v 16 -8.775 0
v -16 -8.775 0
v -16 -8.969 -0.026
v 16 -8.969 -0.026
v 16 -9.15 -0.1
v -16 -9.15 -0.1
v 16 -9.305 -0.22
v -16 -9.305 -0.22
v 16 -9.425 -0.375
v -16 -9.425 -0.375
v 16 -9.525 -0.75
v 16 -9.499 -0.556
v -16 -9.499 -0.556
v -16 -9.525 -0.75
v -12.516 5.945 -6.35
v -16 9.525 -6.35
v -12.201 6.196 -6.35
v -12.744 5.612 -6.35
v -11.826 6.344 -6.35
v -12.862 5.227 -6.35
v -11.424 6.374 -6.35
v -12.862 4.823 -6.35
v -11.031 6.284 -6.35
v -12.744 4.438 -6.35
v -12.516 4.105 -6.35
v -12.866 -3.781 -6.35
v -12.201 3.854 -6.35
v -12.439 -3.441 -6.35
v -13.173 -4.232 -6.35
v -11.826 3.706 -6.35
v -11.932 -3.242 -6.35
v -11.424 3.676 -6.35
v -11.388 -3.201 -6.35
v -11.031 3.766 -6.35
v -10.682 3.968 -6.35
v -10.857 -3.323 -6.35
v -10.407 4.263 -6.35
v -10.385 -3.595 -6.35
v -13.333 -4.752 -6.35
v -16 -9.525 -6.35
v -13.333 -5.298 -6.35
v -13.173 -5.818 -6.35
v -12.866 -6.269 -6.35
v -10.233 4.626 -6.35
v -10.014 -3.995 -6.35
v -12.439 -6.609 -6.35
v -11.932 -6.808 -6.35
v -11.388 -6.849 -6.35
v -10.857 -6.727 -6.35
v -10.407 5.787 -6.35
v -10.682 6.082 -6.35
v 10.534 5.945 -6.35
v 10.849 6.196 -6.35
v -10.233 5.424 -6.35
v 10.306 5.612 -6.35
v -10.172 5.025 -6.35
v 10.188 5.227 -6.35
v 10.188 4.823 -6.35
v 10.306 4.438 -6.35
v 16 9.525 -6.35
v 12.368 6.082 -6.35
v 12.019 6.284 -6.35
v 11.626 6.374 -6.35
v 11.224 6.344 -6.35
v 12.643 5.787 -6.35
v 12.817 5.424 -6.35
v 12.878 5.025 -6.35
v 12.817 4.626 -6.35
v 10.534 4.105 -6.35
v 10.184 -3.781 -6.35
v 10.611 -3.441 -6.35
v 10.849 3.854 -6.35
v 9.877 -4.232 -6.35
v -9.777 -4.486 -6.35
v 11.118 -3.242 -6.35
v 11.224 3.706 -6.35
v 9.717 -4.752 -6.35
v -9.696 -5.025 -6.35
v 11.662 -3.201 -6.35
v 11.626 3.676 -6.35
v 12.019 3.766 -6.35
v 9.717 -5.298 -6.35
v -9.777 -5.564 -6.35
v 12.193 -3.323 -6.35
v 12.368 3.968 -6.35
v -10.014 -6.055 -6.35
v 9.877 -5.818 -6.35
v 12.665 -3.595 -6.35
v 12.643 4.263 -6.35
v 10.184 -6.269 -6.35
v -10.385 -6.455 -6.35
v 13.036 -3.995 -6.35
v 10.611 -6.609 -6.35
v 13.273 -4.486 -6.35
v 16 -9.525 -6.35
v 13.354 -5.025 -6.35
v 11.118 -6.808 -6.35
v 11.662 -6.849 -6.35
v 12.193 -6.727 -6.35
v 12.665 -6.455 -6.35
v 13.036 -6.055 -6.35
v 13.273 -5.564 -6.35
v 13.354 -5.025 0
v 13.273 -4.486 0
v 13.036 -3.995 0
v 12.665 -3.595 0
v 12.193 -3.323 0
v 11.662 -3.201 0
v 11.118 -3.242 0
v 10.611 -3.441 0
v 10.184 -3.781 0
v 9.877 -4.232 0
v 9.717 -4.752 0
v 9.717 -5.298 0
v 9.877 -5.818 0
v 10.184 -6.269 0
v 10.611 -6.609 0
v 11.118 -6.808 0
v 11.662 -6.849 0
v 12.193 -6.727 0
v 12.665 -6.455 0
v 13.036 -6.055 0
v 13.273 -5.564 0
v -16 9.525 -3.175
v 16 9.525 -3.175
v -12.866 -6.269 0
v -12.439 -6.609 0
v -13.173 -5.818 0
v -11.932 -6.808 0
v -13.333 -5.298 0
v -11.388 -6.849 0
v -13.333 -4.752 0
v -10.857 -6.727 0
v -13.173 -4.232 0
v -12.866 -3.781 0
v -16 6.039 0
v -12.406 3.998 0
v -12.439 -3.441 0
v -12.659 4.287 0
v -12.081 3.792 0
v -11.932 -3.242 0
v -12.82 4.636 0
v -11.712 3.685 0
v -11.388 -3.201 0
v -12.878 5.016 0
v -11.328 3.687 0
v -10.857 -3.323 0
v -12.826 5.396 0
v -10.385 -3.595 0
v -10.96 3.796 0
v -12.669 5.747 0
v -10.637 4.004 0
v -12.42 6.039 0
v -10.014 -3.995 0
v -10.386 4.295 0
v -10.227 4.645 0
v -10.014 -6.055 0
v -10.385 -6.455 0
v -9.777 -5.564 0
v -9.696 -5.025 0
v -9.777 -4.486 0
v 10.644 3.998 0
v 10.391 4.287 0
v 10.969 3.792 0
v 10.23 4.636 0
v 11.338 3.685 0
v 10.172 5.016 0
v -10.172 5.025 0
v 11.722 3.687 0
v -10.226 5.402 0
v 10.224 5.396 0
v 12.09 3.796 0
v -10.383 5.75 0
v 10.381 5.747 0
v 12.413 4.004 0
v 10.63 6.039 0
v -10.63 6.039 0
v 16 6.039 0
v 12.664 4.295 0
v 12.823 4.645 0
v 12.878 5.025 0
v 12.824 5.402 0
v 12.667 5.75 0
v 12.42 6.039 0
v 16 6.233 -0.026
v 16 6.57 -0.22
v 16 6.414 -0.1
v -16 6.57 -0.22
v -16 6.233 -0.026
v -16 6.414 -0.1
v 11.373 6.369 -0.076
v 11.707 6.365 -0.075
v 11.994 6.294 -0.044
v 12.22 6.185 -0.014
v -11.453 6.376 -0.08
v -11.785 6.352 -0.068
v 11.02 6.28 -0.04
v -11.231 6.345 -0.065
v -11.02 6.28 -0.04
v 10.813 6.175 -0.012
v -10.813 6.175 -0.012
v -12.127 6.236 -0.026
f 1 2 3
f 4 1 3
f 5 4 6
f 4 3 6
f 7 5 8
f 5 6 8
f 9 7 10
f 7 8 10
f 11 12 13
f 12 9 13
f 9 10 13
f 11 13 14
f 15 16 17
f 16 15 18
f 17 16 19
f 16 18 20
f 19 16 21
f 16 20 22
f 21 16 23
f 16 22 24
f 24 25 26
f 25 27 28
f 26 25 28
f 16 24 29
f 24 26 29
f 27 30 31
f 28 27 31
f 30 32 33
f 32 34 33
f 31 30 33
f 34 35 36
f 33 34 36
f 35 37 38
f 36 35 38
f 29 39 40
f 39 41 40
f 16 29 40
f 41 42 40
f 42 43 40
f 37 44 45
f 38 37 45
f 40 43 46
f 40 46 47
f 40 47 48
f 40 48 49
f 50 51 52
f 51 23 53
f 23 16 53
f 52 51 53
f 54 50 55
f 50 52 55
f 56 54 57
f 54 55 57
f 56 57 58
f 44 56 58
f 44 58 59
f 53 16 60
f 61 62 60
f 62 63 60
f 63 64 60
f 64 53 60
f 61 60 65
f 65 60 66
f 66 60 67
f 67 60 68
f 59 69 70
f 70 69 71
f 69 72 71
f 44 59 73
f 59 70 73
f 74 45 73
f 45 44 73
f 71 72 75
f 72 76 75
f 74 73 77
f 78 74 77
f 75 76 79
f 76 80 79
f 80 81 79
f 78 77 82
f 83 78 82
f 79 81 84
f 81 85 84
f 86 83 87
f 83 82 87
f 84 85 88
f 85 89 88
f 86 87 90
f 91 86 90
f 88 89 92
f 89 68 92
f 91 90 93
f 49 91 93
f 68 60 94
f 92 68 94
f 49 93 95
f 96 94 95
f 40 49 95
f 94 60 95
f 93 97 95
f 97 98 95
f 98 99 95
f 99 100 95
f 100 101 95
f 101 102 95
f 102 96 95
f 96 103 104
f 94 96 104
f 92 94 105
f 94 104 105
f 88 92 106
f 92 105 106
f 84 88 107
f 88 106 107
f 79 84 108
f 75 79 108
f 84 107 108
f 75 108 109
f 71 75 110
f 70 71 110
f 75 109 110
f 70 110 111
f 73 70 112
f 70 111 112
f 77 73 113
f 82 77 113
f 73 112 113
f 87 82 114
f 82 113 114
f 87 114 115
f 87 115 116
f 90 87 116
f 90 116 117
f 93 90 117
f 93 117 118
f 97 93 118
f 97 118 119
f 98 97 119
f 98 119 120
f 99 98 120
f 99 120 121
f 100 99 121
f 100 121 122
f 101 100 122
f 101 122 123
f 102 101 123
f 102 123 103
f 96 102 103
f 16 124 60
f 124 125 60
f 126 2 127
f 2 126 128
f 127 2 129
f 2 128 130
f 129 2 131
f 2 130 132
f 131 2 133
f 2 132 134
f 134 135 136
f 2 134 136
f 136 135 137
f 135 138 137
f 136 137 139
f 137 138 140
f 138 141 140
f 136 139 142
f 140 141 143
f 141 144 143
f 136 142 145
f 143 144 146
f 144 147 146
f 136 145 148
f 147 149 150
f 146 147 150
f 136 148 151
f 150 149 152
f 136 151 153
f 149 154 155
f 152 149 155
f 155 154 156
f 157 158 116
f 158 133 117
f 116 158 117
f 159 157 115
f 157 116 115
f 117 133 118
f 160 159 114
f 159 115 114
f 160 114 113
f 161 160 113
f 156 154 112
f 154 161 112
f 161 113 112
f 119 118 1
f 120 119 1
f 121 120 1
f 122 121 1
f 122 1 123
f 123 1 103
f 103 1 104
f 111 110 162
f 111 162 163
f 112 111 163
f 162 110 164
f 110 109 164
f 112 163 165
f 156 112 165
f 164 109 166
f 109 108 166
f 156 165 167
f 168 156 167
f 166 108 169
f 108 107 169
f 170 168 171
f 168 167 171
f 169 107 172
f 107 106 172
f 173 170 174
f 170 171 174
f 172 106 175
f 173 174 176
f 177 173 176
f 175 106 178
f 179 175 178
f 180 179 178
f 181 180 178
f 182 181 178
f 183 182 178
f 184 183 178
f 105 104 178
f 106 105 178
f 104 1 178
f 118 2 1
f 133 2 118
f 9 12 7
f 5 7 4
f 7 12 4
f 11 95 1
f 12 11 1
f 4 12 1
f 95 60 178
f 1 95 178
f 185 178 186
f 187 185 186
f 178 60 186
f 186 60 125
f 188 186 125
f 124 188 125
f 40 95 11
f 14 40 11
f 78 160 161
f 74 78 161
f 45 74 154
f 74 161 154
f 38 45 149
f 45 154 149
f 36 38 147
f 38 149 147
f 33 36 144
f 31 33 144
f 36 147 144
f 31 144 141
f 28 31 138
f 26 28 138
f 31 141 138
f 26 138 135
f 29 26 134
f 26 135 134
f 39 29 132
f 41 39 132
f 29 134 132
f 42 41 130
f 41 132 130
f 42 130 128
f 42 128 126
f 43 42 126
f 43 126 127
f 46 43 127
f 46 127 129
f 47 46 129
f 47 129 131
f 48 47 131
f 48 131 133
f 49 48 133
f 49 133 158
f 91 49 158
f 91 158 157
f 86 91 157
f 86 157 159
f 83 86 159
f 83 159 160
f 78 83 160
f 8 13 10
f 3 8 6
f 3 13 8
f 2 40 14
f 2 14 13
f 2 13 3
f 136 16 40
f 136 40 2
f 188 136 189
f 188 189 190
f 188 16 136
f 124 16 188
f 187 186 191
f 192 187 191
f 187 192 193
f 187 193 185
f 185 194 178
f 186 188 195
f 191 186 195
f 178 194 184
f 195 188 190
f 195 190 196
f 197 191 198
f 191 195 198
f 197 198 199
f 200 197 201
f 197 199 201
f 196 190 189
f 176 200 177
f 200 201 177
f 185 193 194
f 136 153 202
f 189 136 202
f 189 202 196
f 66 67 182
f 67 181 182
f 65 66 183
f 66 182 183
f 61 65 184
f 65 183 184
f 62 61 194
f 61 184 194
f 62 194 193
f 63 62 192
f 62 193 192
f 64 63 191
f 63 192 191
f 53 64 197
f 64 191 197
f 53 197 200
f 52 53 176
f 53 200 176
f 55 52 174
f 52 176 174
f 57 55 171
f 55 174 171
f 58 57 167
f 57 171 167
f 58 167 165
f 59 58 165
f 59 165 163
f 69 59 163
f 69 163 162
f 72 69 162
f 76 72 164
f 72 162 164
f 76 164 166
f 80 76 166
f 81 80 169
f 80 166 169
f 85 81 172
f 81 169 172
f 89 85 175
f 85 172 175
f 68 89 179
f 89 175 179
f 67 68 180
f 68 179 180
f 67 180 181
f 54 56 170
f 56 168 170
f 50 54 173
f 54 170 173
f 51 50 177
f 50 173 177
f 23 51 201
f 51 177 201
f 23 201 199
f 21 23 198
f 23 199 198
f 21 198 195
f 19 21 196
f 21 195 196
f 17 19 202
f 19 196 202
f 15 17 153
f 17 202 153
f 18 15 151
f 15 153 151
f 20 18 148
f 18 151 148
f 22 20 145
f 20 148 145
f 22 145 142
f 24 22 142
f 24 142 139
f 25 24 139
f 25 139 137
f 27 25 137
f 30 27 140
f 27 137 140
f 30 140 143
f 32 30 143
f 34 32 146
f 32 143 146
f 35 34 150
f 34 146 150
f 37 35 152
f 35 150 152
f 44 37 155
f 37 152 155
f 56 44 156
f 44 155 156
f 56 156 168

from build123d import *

# Parameters (mm, degrees)
BOSS_EXTRUDE1_DEPTH       = 16
F_6_32_TAPPED_HOLE1_D     = 2.7051
F_6_32_TAPPED_HOLE1_DEPTH = 9.398
F_6_32_TAPPED_HOLE1_TIP   = 0.81269403
FILLET1_R                 = 0.75
F_6_CLEARANCE_HOLE2_D     = 3.6576


with BuildPart() as part:
    # Sketch1 → Boss-Extrude1 (new, symmetric)
    with BuildSketch(Plane(origin=(0, 0, 0), x_dir=(0, 0, -1), z_dir=(1, 0, 0))):
        Polygon((0, 6.35), (3.175, 9.525), (6.35, 9.525), (6.35, -9.525), (0, -9.525), align=None)
    extrude(amount=BOSS_EXTRUDE1_DEPTH, both=True)

    # #6-32 Tapped Hole1
    with Locations(Plane(origin=(0, 0, -6.35), x_dir=(-1, 0, 0), z_dir=(0, 0, -1))):
        with Locations((11.525, 5.025), (-11.525, 5.025)):
            Hole(F_6_32_TAPPED_HOLE1_D / 2, depth=F_6_32_TAPPED_HOLE1_DEPTH)
            with Locations((0, 0, -(F_6_32_TAPPED_HOLE1_DEPTH + F_6_32_TAPPED_HOLE1_TIP / 2))):  # 118° drill point
                Cone(0, F_6_32_TAPPED_HOLE1_D / 2, F_6_32_TAPPED_HOLE1_TIP, mode=Mode.SUBTRACT)

    # Fillet1
    # the kernel refuses this fillet: 0.75 mm, written as the material it takes off along each edge
    with BuildSketch(Plane(origin=(-16.776650429, 6.35, 0), x_dir=(0, 0.707106781186552, -0.7071067811865431), z_dir=(1, 0, 0)), Plane(origin=(11.019949465, 6.35, 0), x_dir=(0, 0.707106781186552, -0.7071067811865431), z_dir=(1, 0, 0))) as fillet1_piece_1:
        with BuildLine():
            CenterArc((FILLET1_R * 0.414213562373, -FILLET1_R), FILLET1_R, 90, 45)
            Line((-FILLET1_R * 0.292893218813, -FILLET1_R * 0.292893218813), (0, 0))
            Line((0, 0), (FILLET1_R * 0.414213562373, 0))
        make_face()
    extrude(amount=5.756700965, mode=Mode.SUBTRACT)
    with BuildSketch(Plane(origin=(-12.030050535, 6.35, 0), x_dir=(0, 0.707106781186552, -0.7071067811865431), z_dir=(1, 0, 0))) as fillet1_piece_2:
        with BuildLine():
            CenterArc((FILLET1_R * 0.414213562373, -FILLET1_R), FILLET1_R, 90, 45)
            Line((-FILLET1_R * 0.292893218813, -FILLET1_R * 0.292893218813), (0, 0))
            Line((0, 0), (FILLET1_R * 0.414213562373, 0))
        make_face()
    extrude(amount=24.060101071, mode=Mode.SUBTRACT)
    with BuildSketch(Plane(origin=(-17.875, -9.525, 0), x_dir=(0, 1, 0), z_dir=(1, 0, 0))) as fillet1_piece_3:
        with BuildLine():
            CenterArc((FILLET1_R, -FILLET1_R), FILLET1_R, 90, 90)
            Line((0, -FILLET1_R), (0, 0))
            Line((0, 0), (FILLET1_R, 0))
        make_face()
    extrude(amount=35.75, mode=Mode.SUBTRACT)

    # #6 Clearance Hole2 (through all)
    with Locations(Plane(origin=(0, 0, -6.35), x_dir=(-1, 0, 0), z_dir=(0, 0, -1))):
        with Locations((-11.525, -5.025), (11.525, -5.025)):
            Hole(F_6_CLEARANCE_HOLE2_D / 2)


solid = part.part
